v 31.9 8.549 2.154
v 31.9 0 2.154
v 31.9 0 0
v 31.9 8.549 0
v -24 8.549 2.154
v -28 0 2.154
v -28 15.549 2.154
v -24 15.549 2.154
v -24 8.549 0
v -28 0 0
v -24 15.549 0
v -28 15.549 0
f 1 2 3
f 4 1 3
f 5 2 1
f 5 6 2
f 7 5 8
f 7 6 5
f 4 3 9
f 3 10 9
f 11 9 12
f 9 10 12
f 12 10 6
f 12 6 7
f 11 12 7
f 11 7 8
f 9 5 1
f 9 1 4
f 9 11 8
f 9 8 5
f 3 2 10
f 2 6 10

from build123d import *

# Parameters (mm, degrees)
BOSS_EXTRUDE1_DEPTH = 2.1536931
CUT_EXTRUDE1_REACH  = 56.318
SKETCH3_W           = 2.1536931
SKETCH3_H           = 7
SKETCH4_W           = 2.1536931
SKETCH4_H           = 8.5489795
BOSS_EXTRUDE2_DEPTH = 3.9


with BuildPart() as part:
    # Sketch1 → Boss-Extrude1 (new body)
    with BuildSketch(Plane.XY):
        Polygon((28, 0), (-28, 0), (-28, 15.5489795), (-24, 15.5489795), (-24, 8.5489795), (24, 8.5489795), (24, 15.5489795), (28, 15.5489795), align=None)
    extrude(amount=BOSS_EXTRUDE1_DEPTH)

    # Sketch3 → Cut-Extrude1 (cut, up to next)
    with BuildSketch(Plane.ZY.offset(-24), mode=Mode.PRIVATE) as cut_extrude1_sk1:
        with Locations((1.07684655, 12.0489795)):
            Rectangle(SKETCH3_W, SKETCH3_H)
    cut_extrude1_tool1 = extrude(cut_extrude1_sk1.sketch, amount=-CUT_EXTRUDE1_REACH, mode=Mode.PRIVATE) & part.part
    add(cut_extrude1_tool1.solids().sort_by_distance((24, 12.048979, 1.076847))[0], mode=Mode.SUBTRACT)

    # Sketch4 → Boss-Extrude2 (add)
    with BuildSketch(Plane(origin=(28, 0, 0), x_dir=(0, 0, -1), z_dir=(1, 0, 0))):
        with Locations((-1.07684655, 4.27448975)):
            Rectangle(SKETCH4_W, SKETCH4_H)
    extrude(amount=BOSS_EXTRUDE2_DEPTH)


solid = part.part
